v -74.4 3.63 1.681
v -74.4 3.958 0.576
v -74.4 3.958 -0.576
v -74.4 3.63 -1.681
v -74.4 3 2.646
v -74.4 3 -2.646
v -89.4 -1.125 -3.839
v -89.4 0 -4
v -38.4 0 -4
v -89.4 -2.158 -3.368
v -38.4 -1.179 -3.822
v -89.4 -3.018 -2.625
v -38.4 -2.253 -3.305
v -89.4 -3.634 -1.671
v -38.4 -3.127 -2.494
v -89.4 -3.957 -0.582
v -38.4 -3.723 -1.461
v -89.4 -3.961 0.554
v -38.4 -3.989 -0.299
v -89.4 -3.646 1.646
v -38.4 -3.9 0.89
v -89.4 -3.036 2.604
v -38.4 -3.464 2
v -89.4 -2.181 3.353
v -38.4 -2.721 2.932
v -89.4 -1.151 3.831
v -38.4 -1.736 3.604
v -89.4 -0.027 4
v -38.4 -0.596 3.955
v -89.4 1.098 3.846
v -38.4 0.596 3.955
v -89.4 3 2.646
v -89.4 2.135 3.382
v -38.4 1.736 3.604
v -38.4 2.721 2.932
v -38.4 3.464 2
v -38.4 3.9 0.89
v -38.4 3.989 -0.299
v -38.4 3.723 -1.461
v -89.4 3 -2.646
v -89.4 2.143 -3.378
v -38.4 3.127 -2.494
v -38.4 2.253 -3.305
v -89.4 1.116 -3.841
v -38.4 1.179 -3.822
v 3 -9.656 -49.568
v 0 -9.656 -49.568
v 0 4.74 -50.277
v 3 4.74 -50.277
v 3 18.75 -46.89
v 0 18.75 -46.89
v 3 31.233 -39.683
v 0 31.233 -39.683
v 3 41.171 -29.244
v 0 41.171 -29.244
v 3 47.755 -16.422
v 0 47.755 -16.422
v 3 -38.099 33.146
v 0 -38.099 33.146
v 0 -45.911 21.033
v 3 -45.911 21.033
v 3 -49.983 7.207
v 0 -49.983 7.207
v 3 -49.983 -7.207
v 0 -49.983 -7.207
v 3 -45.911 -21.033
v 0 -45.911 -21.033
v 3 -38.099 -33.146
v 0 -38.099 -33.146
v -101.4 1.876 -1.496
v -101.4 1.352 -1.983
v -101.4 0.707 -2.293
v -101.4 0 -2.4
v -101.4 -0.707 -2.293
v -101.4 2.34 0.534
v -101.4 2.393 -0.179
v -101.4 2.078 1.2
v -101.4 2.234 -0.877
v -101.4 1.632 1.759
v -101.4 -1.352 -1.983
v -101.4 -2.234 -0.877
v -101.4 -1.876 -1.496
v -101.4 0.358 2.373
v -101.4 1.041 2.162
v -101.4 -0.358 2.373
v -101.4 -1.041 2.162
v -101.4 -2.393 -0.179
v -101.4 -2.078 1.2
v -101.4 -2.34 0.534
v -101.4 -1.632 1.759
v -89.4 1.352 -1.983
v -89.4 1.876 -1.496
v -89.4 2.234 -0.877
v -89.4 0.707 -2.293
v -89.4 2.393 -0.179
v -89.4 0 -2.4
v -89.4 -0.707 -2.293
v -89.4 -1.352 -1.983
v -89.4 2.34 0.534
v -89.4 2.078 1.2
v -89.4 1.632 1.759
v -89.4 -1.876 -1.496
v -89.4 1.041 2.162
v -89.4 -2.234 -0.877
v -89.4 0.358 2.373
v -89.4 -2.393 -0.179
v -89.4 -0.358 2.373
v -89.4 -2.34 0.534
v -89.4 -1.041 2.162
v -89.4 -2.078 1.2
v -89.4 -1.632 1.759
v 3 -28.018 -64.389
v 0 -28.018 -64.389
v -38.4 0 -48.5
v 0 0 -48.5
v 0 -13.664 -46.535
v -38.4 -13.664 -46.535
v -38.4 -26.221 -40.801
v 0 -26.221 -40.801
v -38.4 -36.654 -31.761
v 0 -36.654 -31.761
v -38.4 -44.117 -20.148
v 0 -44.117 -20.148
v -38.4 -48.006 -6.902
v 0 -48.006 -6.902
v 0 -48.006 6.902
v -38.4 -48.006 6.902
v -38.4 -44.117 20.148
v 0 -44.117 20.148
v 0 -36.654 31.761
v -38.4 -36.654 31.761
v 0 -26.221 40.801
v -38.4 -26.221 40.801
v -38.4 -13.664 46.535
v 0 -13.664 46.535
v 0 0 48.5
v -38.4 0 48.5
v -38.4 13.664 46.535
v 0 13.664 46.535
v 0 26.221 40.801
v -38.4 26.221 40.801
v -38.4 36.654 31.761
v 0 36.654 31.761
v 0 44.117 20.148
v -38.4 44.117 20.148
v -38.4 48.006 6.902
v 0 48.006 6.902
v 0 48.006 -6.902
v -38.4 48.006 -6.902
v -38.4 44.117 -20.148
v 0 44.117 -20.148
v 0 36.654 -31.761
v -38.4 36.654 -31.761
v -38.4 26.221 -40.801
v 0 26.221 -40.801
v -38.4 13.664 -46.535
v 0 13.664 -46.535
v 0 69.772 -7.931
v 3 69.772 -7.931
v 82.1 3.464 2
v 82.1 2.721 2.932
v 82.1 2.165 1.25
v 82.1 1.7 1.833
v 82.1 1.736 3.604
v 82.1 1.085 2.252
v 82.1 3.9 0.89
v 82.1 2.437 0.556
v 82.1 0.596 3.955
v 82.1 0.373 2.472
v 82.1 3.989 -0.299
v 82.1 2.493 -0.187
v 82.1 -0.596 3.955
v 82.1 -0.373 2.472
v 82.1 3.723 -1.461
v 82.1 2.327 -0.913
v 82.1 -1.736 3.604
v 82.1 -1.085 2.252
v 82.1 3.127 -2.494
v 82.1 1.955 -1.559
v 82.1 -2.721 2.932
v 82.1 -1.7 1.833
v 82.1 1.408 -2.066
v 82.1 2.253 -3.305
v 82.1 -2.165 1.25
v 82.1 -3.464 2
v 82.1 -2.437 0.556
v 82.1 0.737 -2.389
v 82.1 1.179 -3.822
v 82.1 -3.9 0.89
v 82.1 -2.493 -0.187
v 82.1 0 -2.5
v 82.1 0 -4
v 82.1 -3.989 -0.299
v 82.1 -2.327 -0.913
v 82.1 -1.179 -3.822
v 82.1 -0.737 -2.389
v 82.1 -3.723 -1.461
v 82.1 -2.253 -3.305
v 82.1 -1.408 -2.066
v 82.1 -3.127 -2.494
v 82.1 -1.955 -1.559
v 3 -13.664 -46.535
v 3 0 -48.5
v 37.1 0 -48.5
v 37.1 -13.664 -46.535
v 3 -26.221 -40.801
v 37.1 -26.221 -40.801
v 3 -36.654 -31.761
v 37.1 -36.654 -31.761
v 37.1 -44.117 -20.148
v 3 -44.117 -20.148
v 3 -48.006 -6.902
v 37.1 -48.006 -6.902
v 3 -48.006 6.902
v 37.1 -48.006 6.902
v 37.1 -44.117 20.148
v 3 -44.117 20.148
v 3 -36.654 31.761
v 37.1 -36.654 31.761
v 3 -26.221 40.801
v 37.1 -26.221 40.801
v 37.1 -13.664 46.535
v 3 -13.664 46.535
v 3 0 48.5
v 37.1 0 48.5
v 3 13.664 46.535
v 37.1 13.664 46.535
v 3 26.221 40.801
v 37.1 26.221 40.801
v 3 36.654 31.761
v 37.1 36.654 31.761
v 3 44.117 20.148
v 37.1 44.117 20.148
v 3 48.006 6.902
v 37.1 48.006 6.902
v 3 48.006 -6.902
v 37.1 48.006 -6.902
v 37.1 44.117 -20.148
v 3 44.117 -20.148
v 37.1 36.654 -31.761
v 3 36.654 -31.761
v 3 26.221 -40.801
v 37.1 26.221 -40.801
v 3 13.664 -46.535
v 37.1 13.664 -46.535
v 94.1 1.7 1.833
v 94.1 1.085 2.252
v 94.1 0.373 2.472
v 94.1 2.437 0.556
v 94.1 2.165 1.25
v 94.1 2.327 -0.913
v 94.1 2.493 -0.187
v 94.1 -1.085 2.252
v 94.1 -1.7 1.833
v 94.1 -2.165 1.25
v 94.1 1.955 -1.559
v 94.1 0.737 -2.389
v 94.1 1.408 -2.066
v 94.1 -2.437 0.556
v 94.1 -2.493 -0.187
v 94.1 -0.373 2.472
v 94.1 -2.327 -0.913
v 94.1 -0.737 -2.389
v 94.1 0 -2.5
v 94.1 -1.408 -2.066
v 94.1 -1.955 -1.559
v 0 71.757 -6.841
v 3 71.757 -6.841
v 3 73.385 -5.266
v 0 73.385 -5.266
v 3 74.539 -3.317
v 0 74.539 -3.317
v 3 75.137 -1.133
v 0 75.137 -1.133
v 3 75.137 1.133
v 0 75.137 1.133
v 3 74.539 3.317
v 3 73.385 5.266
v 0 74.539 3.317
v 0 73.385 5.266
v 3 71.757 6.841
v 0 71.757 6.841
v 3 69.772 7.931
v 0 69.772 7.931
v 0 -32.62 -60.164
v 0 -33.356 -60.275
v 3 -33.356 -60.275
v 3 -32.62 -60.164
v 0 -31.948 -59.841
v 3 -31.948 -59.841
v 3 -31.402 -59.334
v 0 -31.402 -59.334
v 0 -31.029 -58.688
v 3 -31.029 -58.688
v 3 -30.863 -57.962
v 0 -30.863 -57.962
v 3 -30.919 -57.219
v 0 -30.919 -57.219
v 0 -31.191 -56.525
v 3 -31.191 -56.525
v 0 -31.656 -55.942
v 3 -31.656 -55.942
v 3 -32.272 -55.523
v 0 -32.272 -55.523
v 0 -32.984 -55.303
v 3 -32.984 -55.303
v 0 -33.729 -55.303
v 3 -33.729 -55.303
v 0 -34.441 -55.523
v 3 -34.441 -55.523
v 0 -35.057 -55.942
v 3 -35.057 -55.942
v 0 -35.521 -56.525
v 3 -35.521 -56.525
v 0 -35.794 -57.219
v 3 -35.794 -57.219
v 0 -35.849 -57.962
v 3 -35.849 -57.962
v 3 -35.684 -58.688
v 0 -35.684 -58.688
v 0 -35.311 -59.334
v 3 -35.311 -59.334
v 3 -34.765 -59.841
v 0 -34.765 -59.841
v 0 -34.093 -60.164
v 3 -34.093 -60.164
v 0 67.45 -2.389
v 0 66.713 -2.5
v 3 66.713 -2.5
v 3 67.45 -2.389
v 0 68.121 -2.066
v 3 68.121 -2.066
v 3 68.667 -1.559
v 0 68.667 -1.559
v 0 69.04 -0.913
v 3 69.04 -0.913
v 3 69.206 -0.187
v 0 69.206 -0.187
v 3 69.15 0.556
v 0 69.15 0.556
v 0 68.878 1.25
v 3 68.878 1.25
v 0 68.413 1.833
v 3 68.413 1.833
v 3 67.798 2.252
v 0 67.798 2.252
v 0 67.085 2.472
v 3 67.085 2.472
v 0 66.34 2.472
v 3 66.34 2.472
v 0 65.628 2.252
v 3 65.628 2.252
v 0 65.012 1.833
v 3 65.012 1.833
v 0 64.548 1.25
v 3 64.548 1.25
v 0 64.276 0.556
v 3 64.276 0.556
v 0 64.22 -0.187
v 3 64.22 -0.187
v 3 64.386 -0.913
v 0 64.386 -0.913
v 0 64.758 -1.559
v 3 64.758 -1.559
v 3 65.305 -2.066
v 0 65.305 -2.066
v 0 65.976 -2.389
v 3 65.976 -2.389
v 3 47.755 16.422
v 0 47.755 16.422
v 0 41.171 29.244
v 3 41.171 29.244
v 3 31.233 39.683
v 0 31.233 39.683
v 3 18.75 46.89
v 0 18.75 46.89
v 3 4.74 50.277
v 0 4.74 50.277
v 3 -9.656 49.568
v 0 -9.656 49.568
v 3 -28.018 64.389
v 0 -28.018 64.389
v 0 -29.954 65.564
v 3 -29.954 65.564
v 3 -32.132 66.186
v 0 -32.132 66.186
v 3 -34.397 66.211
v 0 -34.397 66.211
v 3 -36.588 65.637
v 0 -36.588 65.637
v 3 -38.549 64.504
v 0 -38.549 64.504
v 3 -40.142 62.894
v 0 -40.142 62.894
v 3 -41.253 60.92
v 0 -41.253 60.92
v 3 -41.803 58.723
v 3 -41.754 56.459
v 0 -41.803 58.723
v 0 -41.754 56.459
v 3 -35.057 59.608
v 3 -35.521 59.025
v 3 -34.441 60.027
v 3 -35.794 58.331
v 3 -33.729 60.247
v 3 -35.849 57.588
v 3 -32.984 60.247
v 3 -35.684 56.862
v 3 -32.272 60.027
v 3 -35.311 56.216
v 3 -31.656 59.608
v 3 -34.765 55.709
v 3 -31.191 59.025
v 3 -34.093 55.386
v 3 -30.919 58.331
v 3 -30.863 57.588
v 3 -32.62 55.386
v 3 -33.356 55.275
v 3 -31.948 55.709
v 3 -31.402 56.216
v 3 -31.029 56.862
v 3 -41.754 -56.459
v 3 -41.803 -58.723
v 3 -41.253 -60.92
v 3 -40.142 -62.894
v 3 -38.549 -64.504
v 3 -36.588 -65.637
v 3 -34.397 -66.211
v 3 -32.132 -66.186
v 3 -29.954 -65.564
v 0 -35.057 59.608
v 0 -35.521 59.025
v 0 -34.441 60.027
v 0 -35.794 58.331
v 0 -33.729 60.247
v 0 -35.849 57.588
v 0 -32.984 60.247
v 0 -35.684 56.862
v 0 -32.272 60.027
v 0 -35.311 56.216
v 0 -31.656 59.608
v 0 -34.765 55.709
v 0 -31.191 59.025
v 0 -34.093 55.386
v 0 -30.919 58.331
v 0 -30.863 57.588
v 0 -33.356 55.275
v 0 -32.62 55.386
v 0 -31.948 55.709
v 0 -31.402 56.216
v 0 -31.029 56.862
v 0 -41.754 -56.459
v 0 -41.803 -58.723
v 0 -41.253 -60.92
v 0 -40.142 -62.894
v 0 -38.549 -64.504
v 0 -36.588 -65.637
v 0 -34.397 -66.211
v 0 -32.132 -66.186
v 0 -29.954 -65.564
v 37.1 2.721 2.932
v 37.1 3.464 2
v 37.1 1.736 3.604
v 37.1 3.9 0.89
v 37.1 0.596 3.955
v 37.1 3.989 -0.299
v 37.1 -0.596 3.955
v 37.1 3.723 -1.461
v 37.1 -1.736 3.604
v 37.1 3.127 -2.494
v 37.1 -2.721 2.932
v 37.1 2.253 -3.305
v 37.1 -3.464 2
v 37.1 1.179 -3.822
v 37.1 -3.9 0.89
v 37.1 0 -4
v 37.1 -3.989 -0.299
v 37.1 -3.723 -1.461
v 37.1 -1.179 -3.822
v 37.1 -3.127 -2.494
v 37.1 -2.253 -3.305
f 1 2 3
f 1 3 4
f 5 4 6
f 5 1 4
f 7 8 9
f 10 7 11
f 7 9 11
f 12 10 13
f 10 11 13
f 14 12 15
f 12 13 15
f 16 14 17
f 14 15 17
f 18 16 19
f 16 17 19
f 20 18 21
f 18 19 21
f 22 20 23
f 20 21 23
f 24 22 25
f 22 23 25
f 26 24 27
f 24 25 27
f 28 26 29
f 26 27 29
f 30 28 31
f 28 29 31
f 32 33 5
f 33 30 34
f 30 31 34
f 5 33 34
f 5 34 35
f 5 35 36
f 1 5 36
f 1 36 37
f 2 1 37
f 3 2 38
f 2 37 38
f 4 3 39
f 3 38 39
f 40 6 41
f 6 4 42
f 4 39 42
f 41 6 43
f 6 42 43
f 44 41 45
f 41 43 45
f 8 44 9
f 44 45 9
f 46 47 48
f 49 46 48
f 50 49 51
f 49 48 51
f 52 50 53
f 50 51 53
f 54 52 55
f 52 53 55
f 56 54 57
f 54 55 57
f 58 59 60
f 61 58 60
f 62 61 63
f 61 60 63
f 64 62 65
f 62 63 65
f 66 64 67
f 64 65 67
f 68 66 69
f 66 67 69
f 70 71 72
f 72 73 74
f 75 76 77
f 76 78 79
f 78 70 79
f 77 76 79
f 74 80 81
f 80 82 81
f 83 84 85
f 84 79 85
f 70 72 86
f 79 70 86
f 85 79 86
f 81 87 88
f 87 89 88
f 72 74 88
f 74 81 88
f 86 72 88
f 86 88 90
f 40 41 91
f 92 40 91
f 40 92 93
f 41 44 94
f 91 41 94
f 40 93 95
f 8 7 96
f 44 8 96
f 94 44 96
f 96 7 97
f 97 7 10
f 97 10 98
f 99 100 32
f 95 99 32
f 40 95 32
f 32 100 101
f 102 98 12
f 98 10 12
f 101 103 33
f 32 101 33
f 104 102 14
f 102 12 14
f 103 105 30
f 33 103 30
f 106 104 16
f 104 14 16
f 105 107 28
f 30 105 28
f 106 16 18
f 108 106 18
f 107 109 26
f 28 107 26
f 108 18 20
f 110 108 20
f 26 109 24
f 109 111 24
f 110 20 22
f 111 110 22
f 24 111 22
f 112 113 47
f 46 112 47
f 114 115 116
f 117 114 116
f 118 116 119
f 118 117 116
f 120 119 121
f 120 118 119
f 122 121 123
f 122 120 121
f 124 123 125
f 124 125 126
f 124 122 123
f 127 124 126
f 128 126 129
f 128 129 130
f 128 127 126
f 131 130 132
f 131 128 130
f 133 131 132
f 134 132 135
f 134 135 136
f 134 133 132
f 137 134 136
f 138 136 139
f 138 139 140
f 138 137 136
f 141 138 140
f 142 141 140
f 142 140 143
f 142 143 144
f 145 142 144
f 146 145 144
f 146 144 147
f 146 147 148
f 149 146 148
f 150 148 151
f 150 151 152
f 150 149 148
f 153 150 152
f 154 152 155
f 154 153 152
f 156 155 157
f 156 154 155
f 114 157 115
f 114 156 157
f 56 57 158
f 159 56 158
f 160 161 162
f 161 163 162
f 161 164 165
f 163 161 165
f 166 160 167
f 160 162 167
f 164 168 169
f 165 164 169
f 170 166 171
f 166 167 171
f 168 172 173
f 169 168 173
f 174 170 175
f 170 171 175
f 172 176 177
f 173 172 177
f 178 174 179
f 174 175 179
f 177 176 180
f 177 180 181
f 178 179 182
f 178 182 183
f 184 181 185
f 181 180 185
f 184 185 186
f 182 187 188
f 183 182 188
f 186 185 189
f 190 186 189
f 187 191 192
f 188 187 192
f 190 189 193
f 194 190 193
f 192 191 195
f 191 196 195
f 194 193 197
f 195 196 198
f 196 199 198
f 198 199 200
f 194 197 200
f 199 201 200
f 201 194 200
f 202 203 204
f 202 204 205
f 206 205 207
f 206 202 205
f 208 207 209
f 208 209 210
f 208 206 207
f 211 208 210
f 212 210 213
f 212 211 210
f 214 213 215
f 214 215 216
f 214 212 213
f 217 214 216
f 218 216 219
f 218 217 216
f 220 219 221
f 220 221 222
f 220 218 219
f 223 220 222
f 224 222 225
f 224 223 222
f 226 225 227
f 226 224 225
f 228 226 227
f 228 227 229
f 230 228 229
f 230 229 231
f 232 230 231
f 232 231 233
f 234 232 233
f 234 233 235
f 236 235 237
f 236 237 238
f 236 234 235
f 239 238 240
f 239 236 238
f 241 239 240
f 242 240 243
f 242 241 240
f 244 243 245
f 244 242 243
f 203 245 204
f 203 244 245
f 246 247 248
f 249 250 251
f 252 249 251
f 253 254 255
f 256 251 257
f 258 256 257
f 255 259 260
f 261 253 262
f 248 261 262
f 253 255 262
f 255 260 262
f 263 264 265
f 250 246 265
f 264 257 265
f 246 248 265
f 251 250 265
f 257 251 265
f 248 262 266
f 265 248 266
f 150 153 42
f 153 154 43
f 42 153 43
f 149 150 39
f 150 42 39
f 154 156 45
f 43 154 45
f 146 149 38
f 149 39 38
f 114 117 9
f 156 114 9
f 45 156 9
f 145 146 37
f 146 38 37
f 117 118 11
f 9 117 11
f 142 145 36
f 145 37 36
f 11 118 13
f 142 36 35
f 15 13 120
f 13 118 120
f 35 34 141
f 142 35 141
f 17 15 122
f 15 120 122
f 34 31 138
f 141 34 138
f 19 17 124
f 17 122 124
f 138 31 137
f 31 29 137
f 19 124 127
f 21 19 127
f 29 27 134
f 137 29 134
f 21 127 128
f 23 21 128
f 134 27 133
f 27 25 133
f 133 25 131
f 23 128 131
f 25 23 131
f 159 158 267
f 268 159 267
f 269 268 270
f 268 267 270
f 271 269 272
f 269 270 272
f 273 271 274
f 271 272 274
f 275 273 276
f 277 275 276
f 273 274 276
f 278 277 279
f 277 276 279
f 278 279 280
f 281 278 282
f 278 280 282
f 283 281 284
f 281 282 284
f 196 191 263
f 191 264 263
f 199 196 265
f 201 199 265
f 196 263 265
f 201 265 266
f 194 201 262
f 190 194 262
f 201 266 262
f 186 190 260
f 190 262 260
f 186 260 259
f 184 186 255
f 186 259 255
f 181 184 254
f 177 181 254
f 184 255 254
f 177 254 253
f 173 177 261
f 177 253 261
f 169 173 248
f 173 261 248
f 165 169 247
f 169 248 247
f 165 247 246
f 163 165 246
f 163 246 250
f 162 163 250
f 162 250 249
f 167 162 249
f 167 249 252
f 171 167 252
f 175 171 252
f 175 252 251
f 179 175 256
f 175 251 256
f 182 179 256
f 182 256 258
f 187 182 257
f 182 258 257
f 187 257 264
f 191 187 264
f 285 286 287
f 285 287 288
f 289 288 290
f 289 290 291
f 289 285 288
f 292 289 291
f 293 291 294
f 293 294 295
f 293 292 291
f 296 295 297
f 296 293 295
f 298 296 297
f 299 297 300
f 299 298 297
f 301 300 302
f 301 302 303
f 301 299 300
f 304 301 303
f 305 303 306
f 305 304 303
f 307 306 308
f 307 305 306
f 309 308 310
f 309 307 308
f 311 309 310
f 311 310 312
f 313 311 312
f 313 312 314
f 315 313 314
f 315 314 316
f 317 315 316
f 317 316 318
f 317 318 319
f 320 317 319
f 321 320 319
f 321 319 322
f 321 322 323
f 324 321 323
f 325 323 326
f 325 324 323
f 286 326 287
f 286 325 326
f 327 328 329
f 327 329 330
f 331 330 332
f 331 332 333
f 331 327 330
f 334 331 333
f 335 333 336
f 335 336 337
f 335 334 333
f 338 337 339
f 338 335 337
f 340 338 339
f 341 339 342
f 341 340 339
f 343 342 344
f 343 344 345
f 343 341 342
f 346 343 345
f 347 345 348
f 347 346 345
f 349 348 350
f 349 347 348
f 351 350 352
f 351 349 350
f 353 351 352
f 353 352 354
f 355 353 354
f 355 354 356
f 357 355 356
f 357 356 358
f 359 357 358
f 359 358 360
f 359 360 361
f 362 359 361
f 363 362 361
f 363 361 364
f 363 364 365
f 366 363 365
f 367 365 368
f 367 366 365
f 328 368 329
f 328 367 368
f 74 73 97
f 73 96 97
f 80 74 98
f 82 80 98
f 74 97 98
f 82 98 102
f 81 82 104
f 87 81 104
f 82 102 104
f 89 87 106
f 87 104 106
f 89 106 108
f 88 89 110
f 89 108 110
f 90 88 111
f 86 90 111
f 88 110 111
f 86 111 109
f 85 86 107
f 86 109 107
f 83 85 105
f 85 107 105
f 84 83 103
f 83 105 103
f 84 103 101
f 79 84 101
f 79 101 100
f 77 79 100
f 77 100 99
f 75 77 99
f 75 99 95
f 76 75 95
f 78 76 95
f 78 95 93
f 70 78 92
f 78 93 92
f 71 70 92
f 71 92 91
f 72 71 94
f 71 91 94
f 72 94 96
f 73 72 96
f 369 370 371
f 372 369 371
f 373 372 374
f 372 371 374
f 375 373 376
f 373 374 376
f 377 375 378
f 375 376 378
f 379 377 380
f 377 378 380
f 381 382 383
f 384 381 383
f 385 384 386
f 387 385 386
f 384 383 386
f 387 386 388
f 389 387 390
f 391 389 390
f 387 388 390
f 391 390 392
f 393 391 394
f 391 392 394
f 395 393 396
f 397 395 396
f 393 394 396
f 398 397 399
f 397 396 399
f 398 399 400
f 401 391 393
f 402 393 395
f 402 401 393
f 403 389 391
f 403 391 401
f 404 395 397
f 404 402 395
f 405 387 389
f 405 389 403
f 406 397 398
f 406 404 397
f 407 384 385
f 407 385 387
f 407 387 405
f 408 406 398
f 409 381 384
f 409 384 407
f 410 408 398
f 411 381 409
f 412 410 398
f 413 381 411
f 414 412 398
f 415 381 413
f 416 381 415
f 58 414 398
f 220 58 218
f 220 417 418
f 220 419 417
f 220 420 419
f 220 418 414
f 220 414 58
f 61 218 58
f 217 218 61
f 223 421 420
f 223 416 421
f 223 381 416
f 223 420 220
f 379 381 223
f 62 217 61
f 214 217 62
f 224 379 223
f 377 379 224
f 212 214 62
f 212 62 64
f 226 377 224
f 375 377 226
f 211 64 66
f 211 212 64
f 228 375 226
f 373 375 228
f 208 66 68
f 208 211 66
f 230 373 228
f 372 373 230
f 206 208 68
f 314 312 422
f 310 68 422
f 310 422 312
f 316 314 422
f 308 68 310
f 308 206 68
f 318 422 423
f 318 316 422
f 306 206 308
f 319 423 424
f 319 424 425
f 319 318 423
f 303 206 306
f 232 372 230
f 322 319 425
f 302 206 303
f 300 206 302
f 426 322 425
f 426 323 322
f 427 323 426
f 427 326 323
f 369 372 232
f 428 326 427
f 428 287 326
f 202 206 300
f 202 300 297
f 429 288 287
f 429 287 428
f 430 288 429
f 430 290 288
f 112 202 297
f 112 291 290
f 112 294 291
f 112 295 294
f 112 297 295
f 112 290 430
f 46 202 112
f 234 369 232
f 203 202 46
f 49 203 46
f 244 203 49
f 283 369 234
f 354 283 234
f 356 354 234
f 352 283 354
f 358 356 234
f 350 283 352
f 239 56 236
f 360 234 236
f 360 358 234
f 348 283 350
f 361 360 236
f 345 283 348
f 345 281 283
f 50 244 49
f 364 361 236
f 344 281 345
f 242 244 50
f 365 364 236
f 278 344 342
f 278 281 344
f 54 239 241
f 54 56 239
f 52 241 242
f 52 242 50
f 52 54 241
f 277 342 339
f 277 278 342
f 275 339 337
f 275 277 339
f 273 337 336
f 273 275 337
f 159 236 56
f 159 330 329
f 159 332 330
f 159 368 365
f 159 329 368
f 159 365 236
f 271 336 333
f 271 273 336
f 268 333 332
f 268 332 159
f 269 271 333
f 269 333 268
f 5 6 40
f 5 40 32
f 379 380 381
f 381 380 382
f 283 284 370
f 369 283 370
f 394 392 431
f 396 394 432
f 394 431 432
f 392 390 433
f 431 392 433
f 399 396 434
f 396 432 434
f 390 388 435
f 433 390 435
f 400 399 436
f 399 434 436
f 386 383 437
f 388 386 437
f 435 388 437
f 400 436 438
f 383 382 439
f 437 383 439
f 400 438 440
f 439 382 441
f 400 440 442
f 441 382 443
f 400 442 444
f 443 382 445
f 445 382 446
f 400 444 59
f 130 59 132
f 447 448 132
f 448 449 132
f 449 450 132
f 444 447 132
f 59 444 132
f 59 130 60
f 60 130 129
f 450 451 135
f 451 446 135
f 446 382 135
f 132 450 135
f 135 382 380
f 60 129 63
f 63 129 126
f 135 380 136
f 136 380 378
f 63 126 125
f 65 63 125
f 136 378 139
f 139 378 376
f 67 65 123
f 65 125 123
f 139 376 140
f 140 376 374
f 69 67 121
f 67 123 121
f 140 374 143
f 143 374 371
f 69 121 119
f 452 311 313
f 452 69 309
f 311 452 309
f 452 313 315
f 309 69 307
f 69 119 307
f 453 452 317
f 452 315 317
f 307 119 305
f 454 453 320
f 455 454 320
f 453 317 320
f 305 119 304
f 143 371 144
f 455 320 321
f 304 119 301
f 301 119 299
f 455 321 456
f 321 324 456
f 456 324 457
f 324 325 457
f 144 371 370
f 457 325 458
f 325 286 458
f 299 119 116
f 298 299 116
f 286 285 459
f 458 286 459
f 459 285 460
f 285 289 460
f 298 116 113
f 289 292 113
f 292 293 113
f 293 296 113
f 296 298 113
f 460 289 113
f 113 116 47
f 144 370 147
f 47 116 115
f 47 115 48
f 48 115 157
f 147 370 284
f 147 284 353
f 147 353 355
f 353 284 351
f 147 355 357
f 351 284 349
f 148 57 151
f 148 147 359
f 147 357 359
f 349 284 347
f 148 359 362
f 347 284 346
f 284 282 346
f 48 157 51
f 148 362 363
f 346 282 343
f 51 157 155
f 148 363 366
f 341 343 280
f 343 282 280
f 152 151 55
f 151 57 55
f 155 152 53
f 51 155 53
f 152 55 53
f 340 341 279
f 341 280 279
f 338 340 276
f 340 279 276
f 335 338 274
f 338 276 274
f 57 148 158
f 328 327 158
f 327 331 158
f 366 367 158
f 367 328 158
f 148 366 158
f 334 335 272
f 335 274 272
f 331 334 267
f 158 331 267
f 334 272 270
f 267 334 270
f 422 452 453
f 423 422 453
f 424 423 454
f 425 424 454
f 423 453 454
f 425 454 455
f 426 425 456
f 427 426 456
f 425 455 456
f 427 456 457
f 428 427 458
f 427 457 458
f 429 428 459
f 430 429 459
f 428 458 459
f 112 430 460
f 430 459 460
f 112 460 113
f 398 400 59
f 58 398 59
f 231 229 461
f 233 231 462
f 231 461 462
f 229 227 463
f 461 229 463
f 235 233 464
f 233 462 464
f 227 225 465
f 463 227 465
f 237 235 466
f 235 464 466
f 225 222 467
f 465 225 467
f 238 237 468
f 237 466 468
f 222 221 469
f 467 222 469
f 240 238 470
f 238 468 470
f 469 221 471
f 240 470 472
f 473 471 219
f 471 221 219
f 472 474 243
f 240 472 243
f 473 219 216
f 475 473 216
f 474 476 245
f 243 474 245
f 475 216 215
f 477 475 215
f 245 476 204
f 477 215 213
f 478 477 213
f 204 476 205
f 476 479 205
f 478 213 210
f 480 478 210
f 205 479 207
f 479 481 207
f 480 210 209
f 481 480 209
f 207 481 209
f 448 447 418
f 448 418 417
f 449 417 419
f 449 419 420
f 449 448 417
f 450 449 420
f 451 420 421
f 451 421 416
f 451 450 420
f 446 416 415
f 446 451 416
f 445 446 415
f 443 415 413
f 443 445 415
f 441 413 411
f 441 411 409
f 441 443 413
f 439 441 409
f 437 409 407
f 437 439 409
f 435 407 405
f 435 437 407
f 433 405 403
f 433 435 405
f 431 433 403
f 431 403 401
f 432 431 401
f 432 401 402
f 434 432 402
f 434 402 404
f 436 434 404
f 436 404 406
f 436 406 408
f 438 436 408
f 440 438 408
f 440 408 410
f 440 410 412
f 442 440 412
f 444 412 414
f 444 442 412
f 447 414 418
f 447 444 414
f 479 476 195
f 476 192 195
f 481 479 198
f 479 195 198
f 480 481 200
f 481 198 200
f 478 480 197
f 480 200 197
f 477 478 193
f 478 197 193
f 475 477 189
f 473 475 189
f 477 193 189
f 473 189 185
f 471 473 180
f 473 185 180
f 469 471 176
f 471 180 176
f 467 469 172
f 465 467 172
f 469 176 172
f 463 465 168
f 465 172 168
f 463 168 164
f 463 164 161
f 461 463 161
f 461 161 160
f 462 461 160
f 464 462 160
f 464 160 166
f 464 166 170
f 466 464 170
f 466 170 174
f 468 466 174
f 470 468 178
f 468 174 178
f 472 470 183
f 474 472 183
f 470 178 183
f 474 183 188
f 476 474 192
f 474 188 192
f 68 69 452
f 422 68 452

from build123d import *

# Parameters (mm, degrees)
SKETCH2_R           = 2.5
BOSS_EXTRUDE1_DEPTH = 3
CUT_EXTRUDE1_START  = -15
CUT_EXTRUDE1_DEPTH  = 15


with BuildPart() as part:
    # Sketch1 → Revolve1 (revolve)
    with BuildSketch(Plane.XY, mode=Mode.PRIVATE) as revolve1_sk:
        Polygon((0, 48.5), (37.1, 48.5), (37.1, 4), (82.1, 4), (82.1, 2.5), (94.1, 2.5), (94.1, 0), (-101.4, 0), (-101.4, 2.4), (-89.4, 2.4), (-89.4, 4), (-38.4, 4), (-38.4, 48.5), align=None)
    revolve(revolve1_sk.sketch.rotate(Axis((0, 0, 0), (-1, 0, 0)), 90), axis=Axis((0, 0, 0), (-1, 0, 0)))

    # Sketch2 → Boss-Extrude1 (add)
    with BuildSketch(Plane(origin=(0, 0, 0), x_dir=(0, 0, -1), z_dir=(1, 0, 0))):
        with BuildLine():
            Line((-7.930604102, 69.771502825), (-16.421800454, 47.75536064))
            ThreePointArc((-16.421800454, 47.75536064), (-43.734282891, 25.25), (-49.568255708, -9.655983951))
            Line((-49.568255708, -9.655983951), (-64.389195958, -28.017646793))
            ThreePointArc((-64.389195958, -28.017646793), (-65.136215932, -37.606411802), (-56.458591856, -41.753856033))
            Line((-56.458591856, -41.753856033), (-33.146455254, -38.099376689))
            ThreePointArc((-33.146455254, -38.099376689), (0, -50.5), (33.146455254, -38.099376689))
            Line((33.146455254, -38.099376689), (56.458591856, -41.753856033))
            ThreePointArc((56.458591856, -41.753856033), (65.136215932, -37.606411802), (64.389195958, -28.017646793))
            Line((64.389195958, -28.017646793), (49.568255708, -9.655983951))
            ThreePointArc((49.568255708, -9.655983951), (43.734282891, 25.25), (16.421800454, 47.75536064))
            Line((16.421800454, 47.75536064), (7.930604102, 69.771502825))
            ThreePointArc((7.930604102, 69.771502825), (0, 75.212823605), (-7.930604102, 69.771502825))
        make_face()
        with Locations((0, 66.712823605)):
            Circle(SKETCH2_R, mode=Mode.SUBTRACT)
        with Locations((57.775, -33.356411802)):
            Circle(SKETCH2_R, mode=Mode.SUBTRACT)
        with Locations((-57.775, -33.356411802)):
            Circle(SKETCH2_R, mode=Mode.SUBTRACT)
    extrude(amount=BOSS_EXTRUDE1_DEPTH)

    # Sketch4 → Cut-Extrude1 (cut)
    with BuildSketch(Plane.ZY.offset(89.4).offset(CUT_EXTRUDE1_START)):
        with BuildLine():
            Line((-2.645751311, 3), (2.645751311, 3))
            ThreePointArc((2.645751311, 3), (0, 4), (-2.645751311, 3))
        make_face()
    extrude(amount=CUT_EXTRUDE1_DEPTH, mode=Mode.SUBTRACT)


solid = part.part
